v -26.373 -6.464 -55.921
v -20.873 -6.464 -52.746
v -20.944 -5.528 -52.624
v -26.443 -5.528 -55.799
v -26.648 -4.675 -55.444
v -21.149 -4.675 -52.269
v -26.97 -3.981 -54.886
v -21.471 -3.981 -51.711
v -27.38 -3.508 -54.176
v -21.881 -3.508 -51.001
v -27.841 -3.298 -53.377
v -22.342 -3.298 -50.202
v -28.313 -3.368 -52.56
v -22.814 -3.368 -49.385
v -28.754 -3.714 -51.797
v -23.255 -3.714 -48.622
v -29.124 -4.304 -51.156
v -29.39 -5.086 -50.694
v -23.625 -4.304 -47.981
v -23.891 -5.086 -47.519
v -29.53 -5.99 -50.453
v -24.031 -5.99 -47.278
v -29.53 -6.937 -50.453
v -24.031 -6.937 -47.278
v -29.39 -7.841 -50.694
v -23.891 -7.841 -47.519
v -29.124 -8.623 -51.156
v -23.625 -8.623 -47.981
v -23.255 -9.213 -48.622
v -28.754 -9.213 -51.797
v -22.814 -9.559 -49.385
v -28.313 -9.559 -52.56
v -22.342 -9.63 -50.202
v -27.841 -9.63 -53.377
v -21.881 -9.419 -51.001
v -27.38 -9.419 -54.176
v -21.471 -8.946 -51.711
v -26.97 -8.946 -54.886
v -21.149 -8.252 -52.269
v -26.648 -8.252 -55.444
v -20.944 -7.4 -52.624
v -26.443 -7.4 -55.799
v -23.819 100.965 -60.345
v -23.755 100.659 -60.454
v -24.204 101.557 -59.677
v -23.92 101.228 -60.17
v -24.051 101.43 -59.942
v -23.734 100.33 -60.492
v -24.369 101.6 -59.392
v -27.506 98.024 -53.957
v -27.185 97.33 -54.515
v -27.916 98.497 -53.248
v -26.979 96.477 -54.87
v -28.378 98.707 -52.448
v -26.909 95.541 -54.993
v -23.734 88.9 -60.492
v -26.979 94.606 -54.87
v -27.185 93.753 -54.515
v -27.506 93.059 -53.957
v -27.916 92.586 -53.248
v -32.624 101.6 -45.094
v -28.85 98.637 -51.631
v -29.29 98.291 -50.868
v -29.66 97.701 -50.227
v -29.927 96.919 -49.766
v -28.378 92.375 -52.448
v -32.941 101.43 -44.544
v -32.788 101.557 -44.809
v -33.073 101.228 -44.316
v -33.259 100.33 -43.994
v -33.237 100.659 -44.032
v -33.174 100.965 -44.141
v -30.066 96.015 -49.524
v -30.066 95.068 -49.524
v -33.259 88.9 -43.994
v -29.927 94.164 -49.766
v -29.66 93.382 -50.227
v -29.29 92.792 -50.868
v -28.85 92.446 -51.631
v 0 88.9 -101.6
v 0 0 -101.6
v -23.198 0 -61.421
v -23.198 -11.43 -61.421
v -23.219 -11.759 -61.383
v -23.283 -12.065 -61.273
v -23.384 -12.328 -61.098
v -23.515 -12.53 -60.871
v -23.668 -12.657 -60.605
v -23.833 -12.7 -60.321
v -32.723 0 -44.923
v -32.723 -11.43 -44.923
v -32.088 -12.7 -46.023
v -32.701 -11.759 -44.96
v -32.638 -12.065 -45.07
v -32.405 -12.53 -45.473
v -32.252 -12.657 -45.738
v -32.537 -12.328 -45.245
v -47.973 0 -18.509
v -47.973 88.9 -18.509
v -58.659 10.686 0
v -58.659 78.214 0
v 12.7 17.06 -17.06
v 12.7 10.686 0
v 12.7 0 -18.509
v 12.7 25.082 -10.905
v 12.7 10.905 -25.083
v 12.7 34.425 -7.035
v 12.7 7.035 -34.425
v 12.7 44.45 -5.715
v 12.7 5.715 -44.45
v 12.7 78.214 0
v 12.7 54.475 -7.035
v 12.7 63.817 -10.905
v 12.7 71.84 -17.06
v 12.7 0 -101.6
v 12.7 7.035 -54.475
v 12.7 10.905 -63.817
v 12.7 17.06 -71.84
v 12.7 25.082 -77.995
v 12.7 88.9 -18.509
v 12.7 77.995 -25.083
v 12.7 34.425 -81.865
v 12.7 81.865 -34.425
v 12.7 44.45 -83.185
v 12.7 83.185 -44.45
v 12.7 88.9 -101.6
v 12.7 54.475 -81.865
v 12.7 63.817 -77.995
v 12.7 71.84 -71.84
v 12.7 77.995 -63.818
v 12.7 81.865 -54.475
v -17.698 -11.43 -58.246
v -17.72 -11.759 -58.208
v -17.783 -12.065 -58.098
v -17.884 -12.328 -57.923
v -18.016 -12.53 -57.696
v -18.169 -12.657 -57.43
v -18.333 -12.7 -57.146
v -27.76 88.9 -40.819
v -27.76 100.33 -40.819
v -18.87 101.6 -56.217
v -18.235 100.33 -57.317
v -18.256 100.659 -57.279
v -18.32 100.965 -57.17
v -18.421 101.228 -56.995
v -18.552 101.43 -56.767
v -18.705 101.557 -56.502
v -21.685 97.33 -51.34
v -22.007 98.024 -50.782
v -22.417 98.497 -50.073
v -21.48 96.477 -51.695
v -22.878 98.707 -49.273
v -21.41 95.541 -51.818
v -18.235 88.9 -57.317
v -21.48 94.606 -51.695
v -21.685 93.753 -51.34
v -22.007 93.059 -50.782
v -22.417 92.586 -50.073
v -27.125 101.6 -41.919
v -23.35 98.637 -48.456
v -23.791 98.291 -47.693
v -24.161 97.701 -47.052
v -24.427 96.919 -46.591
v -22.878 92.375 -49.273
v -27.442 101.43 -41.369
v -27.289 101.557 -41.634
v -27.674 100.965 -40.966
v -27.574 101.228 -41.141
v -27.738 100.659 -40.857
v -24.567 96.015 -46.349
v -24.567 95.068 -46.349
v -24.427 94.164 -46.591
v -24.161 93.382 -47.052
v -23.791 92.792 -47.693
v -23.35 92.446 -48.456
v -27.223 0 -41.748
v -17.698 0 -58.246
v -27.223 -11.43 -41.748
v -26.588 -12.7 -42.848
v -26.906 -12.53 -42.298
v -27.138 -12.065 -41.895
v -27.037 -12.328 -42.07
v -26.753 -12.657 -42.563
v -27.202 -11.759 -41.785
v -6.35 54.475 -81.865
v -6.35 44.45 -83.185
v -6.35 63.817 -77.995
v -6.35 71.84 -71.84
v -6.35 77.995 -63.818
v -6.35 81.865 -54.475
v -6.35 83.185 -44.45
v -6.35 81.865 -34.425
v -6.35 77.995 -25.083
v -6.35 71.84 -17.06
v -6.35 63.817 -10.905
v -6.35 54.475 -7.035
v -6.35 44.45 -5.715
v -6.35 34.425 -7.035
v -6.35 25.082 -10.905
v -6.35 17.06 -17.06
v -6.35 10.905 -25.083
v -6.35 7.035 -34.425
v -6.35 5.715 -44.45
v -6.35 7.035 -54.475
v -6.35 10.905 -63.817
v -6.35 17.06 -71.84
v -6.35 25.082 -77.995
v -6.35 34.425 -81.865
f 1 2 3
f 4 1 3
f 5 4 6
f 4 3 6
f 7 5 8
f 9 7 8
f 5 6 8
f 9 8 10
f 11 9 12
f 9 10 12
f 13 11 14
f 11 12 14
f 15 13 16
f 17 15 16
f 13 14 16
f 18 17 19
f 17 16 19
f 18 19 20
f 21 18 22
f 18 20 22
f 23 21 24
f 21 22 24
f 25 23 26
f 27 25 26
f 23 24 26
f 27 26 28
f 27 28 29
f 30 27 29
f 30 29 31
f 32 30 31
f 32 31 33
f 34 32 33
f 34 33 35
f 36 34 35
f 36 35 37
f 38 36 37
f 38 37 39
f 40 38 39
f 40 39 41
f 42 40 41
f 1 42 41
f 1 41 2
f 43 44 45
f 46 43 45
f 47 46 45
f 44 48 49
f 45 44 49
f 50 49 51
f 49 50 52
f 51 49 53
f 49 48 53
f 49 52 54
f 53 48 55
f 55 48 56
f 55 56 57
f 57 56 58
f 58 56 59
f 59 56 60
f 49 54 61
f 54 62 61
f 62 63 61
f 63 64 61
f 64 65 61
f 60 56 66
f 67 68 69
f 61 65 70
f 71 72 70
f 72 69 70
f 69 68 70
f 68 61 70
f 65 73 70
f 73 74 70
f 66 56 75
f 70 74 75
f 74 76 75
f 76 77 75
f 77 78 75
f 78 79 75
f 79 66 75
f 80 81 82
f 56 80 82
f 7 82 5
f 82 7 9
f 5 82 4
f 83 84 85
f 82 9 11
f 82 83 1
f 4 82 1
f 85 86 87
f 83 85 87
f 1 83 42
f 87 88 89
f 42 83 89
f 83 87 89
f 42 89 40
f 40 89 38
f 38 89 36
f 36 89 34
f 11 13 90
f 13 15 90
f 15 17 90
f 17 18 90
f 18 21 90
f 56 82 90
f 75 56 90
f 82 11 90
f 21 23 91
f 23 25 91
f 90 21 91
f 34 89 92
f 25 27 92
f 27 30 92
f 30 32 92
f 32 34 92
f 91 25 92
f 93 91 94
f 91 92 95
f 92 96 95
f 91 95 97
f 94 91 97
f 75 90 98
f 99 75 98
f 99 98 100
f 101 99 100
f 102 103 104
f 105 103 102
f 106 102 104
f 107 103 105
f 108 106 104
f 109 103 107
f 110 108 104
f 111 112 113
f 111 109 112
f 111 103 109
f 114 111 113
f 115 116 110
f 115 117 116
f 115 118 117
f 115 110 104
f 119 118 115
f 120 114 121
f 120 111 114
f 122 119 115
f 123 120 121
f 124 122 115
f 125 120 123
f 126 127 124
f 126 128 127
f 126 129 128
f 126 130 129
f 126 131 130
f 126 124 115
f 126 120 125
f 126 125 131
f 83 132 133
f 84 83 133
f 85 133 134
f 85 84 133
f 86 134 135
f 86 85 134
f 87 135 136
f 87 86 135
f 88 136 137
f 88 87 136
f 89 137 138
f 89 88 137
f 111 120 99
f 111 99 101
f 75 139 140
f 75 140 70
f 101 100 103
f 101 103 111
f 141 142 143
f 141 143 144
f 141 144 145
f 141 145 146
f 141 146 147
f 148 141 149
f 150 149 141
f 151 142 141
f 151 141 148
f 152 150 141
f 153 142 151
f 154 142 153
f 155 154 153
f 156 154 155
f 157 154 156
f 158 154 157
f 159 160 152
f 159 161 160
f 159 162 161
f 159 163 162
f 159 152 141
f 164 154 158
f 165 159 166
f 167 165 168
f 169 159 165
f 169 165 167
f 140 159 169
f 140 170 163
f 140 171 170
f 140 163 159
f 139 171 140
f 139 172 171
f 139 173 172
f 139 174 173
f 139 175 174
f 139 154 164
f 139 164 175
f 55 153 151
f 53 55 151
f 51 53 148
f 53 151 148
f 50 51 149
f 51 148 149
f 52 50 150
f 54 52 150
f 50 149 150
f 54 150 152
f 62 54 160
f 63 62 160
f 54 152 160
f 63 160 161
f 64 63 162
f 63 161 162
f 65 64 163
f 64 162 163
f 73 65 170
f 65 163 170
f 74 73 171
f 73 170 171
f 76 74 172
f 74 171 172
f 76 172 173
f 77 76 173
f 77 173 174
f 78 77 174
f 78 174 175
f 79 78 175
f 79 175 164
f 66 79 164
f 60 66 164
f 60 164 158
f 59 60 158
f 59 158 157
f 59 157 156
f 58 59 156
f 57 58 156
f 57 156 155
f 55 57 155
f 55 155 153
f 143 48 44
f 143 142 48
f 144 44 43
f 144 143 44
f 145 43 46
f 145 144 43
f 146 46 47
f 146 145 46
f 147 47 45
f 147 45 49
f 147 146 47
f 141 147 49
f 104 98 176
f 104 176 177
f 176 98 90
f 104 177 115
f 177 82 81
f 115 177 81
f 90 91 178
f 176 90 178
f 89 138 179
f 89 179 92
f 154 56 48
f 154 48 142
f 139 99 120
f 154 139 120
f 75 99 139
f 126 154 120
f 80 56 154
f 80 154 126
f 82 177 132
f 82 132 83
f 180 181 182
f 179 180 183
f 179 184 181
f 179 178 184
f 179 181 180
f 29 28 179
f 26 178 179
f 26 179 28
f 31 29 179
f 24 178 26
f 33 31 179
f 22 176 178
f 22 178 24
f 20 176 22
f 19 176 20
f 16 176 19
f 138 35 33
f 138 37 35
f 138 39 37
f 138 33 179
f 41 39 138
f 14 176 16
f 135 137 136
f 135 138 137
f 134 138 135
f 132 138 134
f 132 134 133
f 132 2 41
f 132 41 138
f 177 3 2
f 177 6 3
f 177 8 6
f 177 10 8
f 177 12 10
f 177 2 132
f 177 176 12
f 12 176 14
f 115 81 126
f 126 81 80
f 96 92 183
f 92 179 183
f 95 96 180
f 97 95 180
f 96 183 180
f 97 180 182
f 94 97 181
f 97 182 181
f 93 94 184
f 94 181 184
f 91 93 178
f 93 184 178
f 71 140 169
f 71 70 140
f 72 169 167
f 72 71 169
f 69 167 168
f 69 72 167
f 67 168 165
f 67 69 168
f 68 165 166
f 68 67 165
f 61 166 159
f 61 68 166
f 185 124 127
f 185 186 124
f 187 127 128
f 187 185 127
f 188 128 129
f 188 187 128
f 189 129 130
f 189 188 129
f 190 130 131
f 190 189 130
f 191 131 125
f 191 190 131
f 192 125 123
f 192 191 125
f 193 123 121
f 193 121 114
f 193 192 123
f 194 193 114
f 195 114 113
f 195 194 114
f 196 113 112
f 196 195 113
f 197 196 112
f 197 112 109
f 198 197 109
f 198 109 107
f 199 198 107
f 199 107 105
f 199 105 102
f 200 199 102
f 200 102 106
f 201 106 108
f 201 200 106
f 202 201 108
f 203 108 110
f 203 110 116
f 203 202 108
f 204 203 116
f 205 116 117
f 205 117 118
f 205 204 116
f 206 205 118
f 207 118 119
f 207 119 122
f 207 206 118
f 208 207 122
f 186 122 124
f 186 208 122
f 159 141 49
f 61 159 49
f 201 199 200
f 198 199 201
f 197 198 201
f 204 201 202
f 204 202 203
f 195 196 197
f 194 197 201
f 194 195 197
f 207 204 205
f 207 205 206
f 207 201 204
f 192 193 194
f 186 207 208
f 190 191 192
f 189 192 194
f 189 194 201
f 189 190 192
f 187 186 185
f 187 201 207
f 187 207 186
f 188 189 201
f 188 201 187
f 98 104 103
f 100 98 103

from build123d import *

# Parameters (mm, degrees)
BOSS_EXTRUDE1_DEPTH = 88.9
SKETCH2_R           = 38.735
CUT_EXTRUDE1_DEPTH  = 6.35
SKETCH3_W           = 101.6
SKETCH3_H           = 88.9
SKETCH3_R           = 38.735
BOSS_EXTRUDE2_DEPTH = 12.7
BOSS_EXTRUDE4_DEPTH = 12.7
SKETCH6_R           = 3.175
CUT_EXTRUDE2_DEPTH  = 58.15
BOSS_EXTRUDE5_DEPTH = 12.7
SKETCH8_R           = 3.175
CUT_EXTRUDE3_DEPTH  = 58.15
FILLET1_R           = 1.27
CUT_EXTRUDE4_DEPTH  = 72.35878735


with BuildPart() as part:
    # Sketch1 → Boss-Extrude1 (new body)
    with BuildSketch(Plane(origin=(0, 0, 0), x_dir=(1, 0, 0), z_dir=(0, 1, 0))):
        Polygon((0, 0), (0, 101.6), (-58.65878735, 0), align=None)
    extrude(amount=BOSS_EXTRUDE1_DEPTH)

    # Sketch2 → Cut-Extrude1 (cut)
    with BuildSketch(Plane(origin=(0, 0, 0), x_dir=(0, 0, -1), z_dir=(1, 0, 0))):
        with Locations((44.45, 44.45)):
            Circle(SKETCH2_R)
    extrude(amount=-CUT_EXTRUDE1_DEPTH, mode=Mode.SUBTRACT)

    # Sketch3 → Boss-Extrude2 (add)
    with BuildSketch(Plane(origin=(0, 0, 0), x_dir=(0, 0, -1), z_dir=(1, 0, 0))):
        with Locations((50.8, 44.45)):
            Rectangle(SKETCH3_W, SKETCH3_H)
        with Locations((44.45, 44.45)):
            Circle(SKETCH3_R, mode=Mode.SUBTRACT)
    extrude(amount=BOSS_EXTRUDE2_DEPTH)

    # Sketch5 → Boss-Extrude4 (add)
    with BuildSketch(Plane.XZ):
        Polygon((-23.197585425, -61.42060343), (-32.722585425, -44.922819488), (-27.223324111, -41.747819488), (-17.698324111, -58.24560343), align=None)
    extrude(amount=BOSS_EXTRUDE4_DEPTH)

    # Sketch6 → Cut-Extrude2 (cut, through all)
    with BuildSketch(Plane(origin=(-38.494829198, 0, -22.225), x_dir=(0.5, 0, -0.866025404), z_dir=(0.866025404, 0, 0.5))):
        with Locations((32.068010174, -6.46367916)):
            Circle(SKETCH6_R)
    extrude(amount=-CUT_EXTRUDE2_DEPTH, mode=Mode.SUBTRACT)

    # Sketch7 → Boss-Extrude5 (add)
    with BuildSketch(Plane(origin=(0, 88.9, 0), x_dir=(1, 0, 0), z_dir=(0, 1, 0))):
        Polygon((-23.73378735, 60.491874454), (-18.234526036, 57.316874454), (-27.759526036, 40.819090512), (-33.25878735, 43.994090512), align=None)
    extrude(amount=BOSS_EXTRUDE5_DEPTH)

    # Sketch8 → Cut-Extrude3 (cut, through all)
    with BuildSketch(Plane(origin=(-38.494829198, 0, -22.225), x_dir=(0.5, 0, -0.866025404), z_dir=(0.866025404, 0, 0.5))):
        with Locations((30.995606325, 95.541359592)):
            Circle(SKETCH8_R)
    extrude(amount=-CUT_EXTRUDE3_DEPTH, mode=Mode.SUBTRACT)

    # Fillet1
    fillet1_edges = [part.edges().sort_by_distance(p)[0] for p in [
        (-20.447954768, -12.7, -59.83310343),
        (-29.972954768, -12.7, -43.335319488),
        (-30.509156693, 101.6, -42.406590512),
        (-20.984156693, 101.6, -58.904374454),
    ]]
    fillet(fillet1_edges, radius=FILLET1_R)

    # Sketch9 → Cut-Extrude4 (cut, through all)
    with BuildSketch(Plane(origin=(12.7, 0, 0), x_dir=(0, 0, -1), z_dir=(1, 0, 0))):
        Polygon((18.509160794, 88.9), (0, 78.213731033), (0, 88.9), align=None)
        Polygon((0, 10.686268967), (0, 0), (18.509160794, 0), align=None)
    extrude(amount=-CUT_EXTRUDE4_DEPTH, mode=Mode.SUBTRACT)


solid = part.part
